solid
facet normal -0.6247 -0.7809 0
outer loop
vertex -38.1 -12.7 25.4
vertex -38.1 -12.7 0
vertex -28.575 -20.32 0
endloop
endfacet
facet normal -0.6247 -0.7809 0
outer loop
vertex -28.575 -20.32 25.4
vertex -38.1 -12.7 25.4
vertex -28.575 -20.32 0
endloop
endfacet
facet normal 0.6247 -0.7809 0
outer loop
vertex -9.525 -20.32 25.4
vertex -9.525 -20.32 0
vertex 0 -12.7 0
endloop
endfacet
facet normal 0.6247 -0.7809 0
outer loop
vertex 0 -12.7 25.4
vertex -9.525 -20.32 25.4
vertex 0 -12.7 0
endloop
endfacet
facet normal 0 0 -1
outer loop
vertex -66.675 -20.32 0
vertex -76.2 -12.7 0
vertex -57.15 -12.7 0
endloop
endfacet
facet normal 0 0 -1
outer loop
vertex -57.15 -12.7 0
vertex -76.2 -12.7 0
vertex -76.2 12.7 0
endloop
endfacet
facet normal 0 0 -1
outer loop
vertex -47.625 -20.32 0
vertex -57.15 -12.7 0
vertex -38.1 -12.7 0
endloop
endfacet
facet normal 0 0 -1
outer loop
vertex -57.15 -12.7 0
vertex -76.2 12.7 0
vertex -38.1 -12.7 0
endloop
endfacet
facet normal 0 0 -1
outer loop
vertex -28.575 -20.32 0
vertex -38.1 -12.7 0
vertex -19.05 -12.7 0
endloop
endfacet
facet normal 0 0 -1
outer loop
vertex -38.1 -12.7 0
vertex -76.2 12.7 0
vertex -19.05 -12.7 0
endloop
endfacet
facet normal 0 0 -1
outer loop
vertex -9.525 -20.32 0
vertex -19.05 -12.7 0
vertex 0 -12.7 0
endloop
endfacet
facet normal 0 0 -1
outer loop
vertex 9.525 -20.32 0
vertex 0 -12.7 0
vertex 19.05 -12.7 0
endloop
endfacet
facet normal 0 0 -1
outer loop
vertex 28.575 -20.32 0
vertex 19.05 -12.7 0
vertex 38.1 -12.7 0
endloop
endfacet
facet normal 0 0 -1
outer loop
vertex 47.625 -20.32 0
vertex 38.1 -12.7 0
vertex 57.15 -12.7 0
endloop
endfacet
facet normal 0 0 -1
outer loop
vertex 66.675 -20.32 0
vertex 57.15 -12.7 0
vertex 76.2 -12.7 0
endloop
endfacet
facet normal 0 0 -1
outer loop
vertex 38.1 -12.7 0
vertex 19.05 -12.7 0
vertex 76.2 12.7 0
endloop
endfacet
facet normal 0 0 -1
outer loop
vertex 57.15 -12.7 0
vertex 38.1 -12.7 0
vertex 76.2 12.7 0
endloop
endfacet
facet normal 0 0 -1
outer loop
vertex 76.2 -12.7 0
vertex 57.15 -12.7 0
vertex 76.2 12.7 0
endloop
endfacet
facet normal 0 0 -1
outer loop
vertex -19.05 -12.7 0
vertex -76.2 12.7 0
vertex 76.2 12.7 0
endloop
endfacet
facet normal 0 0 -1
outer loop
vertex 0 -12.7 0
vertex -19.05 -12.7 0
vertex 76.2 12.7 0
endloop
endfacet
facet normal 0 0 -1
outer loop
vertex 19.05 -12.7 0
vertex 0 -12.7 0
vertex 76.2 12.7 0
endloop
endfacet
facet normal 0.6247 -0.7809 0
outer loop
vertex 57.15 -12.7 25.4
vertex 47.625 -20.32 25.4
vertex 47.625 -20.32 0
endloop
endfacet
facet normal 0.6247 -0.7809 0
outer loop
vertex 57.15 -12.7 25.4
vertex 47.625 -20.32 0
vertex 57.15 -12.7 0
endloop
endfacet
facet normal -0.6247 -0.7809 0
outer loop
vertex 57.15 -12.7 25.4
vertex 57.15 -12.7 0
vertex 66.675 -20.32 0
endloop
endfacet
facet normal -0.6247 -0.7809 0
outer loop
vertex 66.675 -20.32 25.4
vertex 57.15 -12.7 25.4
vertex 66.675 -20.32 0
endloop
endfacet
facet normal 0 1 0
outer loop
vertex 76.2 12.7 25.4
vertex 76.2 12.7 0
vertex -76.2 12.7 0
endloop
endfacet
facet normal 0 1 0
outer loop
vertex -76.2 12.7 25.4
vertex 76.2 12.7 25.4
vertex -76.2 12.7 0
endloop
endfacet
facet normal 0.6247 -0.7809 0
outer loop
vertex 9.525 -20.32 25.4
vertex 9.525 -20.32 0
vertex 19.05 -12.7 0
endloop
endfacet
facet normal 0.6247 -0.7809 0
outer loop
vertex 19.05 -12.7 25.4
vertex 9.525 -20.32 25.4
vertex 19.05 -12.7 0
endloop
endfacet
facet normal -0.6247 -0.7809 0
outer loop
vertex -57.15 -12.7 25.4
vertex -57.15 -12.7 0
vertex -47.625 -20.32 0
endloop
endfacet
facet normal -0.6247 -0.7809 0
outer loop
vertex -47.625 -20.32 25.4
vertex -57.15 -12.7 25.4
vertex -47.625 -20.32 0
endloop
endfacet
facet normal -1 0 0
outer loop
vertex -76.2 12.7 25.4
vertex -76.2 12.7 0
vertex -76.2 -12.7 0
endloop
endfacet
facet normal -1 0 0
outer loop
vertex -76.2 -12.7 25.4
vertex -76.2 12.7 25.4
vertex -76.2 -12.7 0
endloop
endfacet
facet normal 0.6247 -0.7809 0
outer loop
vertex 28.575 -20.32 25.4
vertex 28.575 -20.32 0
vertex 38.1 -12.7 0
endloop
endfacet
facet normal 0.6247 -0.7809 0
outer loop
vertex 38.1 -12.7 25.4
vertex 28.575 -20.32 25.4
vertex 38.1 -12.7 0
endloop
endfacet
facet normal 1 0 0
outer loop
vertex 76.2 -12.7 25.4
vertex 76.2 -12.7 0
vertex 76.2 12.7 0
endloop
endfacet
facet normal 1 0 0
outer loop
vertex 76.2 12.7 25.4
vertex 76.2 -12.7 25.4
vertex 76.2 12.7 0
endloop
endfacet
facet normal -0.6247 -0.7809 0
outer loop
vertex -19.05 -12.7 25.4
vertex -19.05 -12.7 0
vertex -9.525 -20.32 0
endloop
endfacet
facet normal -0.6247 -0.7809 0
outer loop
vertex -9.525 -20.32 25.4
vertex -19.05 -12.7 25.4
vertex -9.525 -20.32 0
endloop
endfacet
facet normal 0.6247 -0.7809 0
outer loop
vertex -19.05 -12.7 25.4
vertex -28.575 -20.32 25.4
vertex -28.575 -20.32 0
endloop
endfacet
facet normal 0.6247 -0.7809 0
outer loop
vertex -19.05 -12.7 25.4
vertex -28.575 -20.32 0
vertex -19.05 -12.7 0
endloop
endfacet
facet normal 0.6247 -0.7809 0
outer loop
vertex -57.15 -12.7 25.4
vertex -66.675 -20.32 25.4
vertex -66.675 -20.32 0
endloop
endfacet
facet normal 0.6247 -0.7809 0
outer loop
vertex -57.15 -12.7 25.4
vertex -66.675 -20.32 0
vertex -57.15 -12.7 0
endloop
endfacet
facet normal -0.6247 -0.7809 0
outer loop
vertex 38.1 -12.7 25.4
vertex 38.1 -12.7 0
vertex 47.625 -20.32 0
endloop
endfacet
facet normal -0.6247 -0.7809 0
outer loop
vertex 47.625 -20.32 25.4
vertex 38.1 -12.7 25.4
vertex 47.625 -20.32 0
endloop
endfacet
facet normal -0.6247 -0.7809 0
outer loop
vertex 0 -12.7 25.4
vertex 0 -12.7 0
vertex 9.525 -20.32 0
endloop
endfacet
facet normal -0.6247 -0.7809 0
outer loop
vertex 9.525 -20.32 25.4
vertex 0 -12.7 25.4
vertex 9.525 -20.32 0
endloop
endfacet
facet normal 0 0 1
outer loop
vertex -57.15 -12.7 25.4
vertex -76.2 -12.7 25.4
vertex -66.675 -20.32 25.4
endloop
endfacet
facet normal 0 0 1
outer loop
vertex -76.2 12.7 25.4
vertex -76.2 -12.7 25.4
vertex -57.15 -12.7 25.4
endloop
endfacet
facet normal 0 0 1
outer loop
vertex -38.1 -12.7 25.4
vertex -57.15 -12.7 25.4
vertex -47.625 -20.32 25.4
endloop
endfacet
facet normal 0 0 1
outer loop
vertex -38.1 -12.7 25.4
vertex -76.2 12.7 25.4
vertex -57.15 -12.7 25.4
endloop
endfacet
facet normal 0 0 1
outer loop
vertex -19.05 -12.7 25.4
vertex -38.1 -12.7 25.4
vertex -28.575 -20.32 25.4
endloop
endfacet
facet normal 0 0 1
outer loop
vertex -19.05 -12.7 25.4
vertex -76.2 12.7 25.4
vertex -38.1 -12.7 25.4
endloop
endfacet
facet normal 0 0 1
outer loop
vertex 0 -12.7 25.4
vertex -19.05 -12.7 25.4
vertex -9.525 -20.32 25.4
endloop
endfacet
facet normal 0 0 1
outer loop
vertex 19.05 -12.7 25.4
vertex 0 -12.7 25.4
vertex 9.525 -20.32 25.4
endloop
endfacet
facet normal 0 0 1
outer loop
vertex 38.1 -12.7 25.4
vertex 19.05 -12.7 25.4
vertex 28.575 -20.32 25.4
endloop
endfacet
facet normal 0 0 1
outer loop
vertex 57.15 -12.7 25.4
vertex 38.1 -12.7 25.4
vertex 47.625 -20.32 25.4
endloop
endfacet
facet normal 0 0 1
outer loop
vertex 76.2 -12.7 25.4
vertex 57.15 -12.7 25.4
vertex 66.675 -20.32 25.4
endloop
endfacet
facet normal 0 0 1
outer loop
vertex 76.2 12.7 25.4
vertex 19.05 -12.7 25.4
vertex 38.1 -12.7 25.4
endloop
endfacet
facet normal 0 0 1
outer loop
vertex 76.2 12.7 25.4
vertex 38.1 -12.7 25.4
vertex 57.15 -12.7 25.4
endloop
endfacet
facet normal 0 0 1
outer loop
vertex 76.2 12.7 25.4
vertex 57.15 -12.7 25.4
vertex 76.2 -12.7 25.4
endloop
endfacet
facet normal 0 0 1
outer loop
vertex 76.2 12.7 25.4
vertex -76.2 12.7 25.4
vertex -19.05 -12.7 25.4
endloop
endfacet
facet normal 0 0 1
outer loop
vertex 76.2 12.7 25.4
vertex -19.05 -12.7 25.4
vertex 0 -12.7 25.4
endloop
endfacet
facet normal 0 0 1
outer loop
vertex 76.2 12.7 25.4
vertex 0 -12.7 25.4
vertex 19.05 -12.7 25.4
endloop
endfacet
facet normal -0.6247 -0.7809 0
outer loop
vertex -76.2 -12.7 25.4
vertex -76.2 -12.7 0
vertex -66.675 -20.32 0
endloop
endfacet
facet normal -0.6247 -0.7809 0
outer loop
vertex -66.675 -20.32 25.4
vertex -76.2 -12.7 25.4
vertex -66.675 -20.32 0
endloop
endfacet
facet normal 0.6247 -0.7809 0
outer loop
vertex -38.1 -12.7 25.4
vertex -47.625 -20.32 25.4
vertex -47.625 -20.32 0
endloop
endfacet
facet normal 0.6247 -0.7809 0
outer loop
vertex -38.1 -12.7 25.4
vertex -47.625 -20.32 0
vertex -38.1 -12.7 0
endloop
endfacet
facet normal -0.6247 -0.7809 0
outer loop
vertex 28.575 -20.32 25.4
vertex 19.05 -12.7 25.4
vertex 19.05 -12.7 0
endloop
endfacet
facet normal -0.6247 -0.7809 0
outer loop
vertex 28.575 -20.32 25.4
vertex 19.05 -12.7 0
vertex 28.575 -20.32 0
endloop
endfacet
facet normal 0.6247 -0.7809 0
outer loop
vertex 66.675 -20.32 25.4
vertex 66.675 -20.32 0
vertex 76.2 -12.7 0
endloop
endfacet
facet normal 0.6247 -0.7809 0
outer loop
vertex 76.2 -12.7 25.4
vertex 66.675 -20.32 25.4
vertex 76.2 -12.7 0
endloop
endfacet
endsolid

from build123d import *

# Parameters (mm, degrees)
F1_DEPTH = 25.4


with BuildPart() as f1:
    # F0 (on Top) → F1 (new body)
    with BuildSketch(Plane.XY):
        Polygon((76.2, -12.7), (76.2, 12.7), (-76.2, 12.7), (-76.2, -12.7), (-57.15, -12.7), (-38.1, -12.7), (-19.05, -12.7), (0, -12.7), (19.05, -12.7), (38.1, -12.7), (57.15, -12.7), align=None)
        Polygon((66.675, -20.32), (76.2, -12.7), (57.15, -12.7), align=None)
        Polygon((-57.15, -12.7), (-76.2, -12.7), (-66.675, -20.32), align=None)
        Polygon((47.625, -20.32), (57.15, -12.7), (38.1, -12.7), align=None)
        Polygon((-38.1, -12.7), (-57.15, -12.7), (-47.625, -20.32), align=None)
        Polygon((28.575, -20.32), (38.1, -12.7), (19.05, -12.7), align=None)
        Polygon((-19.05, -12.7), (-38.1, -12.7), (-28.575, -20.32), align=None)
        Polygon((9.525, -20.32), (19.05, -12.7), (0, -12.7), align=None)
        Polygon((0, -12.7), (-19.05, -12.7), (-9.525, -20.32), align=None)
    extrude(amount=F1_DEPTH)


solid = f1.part
